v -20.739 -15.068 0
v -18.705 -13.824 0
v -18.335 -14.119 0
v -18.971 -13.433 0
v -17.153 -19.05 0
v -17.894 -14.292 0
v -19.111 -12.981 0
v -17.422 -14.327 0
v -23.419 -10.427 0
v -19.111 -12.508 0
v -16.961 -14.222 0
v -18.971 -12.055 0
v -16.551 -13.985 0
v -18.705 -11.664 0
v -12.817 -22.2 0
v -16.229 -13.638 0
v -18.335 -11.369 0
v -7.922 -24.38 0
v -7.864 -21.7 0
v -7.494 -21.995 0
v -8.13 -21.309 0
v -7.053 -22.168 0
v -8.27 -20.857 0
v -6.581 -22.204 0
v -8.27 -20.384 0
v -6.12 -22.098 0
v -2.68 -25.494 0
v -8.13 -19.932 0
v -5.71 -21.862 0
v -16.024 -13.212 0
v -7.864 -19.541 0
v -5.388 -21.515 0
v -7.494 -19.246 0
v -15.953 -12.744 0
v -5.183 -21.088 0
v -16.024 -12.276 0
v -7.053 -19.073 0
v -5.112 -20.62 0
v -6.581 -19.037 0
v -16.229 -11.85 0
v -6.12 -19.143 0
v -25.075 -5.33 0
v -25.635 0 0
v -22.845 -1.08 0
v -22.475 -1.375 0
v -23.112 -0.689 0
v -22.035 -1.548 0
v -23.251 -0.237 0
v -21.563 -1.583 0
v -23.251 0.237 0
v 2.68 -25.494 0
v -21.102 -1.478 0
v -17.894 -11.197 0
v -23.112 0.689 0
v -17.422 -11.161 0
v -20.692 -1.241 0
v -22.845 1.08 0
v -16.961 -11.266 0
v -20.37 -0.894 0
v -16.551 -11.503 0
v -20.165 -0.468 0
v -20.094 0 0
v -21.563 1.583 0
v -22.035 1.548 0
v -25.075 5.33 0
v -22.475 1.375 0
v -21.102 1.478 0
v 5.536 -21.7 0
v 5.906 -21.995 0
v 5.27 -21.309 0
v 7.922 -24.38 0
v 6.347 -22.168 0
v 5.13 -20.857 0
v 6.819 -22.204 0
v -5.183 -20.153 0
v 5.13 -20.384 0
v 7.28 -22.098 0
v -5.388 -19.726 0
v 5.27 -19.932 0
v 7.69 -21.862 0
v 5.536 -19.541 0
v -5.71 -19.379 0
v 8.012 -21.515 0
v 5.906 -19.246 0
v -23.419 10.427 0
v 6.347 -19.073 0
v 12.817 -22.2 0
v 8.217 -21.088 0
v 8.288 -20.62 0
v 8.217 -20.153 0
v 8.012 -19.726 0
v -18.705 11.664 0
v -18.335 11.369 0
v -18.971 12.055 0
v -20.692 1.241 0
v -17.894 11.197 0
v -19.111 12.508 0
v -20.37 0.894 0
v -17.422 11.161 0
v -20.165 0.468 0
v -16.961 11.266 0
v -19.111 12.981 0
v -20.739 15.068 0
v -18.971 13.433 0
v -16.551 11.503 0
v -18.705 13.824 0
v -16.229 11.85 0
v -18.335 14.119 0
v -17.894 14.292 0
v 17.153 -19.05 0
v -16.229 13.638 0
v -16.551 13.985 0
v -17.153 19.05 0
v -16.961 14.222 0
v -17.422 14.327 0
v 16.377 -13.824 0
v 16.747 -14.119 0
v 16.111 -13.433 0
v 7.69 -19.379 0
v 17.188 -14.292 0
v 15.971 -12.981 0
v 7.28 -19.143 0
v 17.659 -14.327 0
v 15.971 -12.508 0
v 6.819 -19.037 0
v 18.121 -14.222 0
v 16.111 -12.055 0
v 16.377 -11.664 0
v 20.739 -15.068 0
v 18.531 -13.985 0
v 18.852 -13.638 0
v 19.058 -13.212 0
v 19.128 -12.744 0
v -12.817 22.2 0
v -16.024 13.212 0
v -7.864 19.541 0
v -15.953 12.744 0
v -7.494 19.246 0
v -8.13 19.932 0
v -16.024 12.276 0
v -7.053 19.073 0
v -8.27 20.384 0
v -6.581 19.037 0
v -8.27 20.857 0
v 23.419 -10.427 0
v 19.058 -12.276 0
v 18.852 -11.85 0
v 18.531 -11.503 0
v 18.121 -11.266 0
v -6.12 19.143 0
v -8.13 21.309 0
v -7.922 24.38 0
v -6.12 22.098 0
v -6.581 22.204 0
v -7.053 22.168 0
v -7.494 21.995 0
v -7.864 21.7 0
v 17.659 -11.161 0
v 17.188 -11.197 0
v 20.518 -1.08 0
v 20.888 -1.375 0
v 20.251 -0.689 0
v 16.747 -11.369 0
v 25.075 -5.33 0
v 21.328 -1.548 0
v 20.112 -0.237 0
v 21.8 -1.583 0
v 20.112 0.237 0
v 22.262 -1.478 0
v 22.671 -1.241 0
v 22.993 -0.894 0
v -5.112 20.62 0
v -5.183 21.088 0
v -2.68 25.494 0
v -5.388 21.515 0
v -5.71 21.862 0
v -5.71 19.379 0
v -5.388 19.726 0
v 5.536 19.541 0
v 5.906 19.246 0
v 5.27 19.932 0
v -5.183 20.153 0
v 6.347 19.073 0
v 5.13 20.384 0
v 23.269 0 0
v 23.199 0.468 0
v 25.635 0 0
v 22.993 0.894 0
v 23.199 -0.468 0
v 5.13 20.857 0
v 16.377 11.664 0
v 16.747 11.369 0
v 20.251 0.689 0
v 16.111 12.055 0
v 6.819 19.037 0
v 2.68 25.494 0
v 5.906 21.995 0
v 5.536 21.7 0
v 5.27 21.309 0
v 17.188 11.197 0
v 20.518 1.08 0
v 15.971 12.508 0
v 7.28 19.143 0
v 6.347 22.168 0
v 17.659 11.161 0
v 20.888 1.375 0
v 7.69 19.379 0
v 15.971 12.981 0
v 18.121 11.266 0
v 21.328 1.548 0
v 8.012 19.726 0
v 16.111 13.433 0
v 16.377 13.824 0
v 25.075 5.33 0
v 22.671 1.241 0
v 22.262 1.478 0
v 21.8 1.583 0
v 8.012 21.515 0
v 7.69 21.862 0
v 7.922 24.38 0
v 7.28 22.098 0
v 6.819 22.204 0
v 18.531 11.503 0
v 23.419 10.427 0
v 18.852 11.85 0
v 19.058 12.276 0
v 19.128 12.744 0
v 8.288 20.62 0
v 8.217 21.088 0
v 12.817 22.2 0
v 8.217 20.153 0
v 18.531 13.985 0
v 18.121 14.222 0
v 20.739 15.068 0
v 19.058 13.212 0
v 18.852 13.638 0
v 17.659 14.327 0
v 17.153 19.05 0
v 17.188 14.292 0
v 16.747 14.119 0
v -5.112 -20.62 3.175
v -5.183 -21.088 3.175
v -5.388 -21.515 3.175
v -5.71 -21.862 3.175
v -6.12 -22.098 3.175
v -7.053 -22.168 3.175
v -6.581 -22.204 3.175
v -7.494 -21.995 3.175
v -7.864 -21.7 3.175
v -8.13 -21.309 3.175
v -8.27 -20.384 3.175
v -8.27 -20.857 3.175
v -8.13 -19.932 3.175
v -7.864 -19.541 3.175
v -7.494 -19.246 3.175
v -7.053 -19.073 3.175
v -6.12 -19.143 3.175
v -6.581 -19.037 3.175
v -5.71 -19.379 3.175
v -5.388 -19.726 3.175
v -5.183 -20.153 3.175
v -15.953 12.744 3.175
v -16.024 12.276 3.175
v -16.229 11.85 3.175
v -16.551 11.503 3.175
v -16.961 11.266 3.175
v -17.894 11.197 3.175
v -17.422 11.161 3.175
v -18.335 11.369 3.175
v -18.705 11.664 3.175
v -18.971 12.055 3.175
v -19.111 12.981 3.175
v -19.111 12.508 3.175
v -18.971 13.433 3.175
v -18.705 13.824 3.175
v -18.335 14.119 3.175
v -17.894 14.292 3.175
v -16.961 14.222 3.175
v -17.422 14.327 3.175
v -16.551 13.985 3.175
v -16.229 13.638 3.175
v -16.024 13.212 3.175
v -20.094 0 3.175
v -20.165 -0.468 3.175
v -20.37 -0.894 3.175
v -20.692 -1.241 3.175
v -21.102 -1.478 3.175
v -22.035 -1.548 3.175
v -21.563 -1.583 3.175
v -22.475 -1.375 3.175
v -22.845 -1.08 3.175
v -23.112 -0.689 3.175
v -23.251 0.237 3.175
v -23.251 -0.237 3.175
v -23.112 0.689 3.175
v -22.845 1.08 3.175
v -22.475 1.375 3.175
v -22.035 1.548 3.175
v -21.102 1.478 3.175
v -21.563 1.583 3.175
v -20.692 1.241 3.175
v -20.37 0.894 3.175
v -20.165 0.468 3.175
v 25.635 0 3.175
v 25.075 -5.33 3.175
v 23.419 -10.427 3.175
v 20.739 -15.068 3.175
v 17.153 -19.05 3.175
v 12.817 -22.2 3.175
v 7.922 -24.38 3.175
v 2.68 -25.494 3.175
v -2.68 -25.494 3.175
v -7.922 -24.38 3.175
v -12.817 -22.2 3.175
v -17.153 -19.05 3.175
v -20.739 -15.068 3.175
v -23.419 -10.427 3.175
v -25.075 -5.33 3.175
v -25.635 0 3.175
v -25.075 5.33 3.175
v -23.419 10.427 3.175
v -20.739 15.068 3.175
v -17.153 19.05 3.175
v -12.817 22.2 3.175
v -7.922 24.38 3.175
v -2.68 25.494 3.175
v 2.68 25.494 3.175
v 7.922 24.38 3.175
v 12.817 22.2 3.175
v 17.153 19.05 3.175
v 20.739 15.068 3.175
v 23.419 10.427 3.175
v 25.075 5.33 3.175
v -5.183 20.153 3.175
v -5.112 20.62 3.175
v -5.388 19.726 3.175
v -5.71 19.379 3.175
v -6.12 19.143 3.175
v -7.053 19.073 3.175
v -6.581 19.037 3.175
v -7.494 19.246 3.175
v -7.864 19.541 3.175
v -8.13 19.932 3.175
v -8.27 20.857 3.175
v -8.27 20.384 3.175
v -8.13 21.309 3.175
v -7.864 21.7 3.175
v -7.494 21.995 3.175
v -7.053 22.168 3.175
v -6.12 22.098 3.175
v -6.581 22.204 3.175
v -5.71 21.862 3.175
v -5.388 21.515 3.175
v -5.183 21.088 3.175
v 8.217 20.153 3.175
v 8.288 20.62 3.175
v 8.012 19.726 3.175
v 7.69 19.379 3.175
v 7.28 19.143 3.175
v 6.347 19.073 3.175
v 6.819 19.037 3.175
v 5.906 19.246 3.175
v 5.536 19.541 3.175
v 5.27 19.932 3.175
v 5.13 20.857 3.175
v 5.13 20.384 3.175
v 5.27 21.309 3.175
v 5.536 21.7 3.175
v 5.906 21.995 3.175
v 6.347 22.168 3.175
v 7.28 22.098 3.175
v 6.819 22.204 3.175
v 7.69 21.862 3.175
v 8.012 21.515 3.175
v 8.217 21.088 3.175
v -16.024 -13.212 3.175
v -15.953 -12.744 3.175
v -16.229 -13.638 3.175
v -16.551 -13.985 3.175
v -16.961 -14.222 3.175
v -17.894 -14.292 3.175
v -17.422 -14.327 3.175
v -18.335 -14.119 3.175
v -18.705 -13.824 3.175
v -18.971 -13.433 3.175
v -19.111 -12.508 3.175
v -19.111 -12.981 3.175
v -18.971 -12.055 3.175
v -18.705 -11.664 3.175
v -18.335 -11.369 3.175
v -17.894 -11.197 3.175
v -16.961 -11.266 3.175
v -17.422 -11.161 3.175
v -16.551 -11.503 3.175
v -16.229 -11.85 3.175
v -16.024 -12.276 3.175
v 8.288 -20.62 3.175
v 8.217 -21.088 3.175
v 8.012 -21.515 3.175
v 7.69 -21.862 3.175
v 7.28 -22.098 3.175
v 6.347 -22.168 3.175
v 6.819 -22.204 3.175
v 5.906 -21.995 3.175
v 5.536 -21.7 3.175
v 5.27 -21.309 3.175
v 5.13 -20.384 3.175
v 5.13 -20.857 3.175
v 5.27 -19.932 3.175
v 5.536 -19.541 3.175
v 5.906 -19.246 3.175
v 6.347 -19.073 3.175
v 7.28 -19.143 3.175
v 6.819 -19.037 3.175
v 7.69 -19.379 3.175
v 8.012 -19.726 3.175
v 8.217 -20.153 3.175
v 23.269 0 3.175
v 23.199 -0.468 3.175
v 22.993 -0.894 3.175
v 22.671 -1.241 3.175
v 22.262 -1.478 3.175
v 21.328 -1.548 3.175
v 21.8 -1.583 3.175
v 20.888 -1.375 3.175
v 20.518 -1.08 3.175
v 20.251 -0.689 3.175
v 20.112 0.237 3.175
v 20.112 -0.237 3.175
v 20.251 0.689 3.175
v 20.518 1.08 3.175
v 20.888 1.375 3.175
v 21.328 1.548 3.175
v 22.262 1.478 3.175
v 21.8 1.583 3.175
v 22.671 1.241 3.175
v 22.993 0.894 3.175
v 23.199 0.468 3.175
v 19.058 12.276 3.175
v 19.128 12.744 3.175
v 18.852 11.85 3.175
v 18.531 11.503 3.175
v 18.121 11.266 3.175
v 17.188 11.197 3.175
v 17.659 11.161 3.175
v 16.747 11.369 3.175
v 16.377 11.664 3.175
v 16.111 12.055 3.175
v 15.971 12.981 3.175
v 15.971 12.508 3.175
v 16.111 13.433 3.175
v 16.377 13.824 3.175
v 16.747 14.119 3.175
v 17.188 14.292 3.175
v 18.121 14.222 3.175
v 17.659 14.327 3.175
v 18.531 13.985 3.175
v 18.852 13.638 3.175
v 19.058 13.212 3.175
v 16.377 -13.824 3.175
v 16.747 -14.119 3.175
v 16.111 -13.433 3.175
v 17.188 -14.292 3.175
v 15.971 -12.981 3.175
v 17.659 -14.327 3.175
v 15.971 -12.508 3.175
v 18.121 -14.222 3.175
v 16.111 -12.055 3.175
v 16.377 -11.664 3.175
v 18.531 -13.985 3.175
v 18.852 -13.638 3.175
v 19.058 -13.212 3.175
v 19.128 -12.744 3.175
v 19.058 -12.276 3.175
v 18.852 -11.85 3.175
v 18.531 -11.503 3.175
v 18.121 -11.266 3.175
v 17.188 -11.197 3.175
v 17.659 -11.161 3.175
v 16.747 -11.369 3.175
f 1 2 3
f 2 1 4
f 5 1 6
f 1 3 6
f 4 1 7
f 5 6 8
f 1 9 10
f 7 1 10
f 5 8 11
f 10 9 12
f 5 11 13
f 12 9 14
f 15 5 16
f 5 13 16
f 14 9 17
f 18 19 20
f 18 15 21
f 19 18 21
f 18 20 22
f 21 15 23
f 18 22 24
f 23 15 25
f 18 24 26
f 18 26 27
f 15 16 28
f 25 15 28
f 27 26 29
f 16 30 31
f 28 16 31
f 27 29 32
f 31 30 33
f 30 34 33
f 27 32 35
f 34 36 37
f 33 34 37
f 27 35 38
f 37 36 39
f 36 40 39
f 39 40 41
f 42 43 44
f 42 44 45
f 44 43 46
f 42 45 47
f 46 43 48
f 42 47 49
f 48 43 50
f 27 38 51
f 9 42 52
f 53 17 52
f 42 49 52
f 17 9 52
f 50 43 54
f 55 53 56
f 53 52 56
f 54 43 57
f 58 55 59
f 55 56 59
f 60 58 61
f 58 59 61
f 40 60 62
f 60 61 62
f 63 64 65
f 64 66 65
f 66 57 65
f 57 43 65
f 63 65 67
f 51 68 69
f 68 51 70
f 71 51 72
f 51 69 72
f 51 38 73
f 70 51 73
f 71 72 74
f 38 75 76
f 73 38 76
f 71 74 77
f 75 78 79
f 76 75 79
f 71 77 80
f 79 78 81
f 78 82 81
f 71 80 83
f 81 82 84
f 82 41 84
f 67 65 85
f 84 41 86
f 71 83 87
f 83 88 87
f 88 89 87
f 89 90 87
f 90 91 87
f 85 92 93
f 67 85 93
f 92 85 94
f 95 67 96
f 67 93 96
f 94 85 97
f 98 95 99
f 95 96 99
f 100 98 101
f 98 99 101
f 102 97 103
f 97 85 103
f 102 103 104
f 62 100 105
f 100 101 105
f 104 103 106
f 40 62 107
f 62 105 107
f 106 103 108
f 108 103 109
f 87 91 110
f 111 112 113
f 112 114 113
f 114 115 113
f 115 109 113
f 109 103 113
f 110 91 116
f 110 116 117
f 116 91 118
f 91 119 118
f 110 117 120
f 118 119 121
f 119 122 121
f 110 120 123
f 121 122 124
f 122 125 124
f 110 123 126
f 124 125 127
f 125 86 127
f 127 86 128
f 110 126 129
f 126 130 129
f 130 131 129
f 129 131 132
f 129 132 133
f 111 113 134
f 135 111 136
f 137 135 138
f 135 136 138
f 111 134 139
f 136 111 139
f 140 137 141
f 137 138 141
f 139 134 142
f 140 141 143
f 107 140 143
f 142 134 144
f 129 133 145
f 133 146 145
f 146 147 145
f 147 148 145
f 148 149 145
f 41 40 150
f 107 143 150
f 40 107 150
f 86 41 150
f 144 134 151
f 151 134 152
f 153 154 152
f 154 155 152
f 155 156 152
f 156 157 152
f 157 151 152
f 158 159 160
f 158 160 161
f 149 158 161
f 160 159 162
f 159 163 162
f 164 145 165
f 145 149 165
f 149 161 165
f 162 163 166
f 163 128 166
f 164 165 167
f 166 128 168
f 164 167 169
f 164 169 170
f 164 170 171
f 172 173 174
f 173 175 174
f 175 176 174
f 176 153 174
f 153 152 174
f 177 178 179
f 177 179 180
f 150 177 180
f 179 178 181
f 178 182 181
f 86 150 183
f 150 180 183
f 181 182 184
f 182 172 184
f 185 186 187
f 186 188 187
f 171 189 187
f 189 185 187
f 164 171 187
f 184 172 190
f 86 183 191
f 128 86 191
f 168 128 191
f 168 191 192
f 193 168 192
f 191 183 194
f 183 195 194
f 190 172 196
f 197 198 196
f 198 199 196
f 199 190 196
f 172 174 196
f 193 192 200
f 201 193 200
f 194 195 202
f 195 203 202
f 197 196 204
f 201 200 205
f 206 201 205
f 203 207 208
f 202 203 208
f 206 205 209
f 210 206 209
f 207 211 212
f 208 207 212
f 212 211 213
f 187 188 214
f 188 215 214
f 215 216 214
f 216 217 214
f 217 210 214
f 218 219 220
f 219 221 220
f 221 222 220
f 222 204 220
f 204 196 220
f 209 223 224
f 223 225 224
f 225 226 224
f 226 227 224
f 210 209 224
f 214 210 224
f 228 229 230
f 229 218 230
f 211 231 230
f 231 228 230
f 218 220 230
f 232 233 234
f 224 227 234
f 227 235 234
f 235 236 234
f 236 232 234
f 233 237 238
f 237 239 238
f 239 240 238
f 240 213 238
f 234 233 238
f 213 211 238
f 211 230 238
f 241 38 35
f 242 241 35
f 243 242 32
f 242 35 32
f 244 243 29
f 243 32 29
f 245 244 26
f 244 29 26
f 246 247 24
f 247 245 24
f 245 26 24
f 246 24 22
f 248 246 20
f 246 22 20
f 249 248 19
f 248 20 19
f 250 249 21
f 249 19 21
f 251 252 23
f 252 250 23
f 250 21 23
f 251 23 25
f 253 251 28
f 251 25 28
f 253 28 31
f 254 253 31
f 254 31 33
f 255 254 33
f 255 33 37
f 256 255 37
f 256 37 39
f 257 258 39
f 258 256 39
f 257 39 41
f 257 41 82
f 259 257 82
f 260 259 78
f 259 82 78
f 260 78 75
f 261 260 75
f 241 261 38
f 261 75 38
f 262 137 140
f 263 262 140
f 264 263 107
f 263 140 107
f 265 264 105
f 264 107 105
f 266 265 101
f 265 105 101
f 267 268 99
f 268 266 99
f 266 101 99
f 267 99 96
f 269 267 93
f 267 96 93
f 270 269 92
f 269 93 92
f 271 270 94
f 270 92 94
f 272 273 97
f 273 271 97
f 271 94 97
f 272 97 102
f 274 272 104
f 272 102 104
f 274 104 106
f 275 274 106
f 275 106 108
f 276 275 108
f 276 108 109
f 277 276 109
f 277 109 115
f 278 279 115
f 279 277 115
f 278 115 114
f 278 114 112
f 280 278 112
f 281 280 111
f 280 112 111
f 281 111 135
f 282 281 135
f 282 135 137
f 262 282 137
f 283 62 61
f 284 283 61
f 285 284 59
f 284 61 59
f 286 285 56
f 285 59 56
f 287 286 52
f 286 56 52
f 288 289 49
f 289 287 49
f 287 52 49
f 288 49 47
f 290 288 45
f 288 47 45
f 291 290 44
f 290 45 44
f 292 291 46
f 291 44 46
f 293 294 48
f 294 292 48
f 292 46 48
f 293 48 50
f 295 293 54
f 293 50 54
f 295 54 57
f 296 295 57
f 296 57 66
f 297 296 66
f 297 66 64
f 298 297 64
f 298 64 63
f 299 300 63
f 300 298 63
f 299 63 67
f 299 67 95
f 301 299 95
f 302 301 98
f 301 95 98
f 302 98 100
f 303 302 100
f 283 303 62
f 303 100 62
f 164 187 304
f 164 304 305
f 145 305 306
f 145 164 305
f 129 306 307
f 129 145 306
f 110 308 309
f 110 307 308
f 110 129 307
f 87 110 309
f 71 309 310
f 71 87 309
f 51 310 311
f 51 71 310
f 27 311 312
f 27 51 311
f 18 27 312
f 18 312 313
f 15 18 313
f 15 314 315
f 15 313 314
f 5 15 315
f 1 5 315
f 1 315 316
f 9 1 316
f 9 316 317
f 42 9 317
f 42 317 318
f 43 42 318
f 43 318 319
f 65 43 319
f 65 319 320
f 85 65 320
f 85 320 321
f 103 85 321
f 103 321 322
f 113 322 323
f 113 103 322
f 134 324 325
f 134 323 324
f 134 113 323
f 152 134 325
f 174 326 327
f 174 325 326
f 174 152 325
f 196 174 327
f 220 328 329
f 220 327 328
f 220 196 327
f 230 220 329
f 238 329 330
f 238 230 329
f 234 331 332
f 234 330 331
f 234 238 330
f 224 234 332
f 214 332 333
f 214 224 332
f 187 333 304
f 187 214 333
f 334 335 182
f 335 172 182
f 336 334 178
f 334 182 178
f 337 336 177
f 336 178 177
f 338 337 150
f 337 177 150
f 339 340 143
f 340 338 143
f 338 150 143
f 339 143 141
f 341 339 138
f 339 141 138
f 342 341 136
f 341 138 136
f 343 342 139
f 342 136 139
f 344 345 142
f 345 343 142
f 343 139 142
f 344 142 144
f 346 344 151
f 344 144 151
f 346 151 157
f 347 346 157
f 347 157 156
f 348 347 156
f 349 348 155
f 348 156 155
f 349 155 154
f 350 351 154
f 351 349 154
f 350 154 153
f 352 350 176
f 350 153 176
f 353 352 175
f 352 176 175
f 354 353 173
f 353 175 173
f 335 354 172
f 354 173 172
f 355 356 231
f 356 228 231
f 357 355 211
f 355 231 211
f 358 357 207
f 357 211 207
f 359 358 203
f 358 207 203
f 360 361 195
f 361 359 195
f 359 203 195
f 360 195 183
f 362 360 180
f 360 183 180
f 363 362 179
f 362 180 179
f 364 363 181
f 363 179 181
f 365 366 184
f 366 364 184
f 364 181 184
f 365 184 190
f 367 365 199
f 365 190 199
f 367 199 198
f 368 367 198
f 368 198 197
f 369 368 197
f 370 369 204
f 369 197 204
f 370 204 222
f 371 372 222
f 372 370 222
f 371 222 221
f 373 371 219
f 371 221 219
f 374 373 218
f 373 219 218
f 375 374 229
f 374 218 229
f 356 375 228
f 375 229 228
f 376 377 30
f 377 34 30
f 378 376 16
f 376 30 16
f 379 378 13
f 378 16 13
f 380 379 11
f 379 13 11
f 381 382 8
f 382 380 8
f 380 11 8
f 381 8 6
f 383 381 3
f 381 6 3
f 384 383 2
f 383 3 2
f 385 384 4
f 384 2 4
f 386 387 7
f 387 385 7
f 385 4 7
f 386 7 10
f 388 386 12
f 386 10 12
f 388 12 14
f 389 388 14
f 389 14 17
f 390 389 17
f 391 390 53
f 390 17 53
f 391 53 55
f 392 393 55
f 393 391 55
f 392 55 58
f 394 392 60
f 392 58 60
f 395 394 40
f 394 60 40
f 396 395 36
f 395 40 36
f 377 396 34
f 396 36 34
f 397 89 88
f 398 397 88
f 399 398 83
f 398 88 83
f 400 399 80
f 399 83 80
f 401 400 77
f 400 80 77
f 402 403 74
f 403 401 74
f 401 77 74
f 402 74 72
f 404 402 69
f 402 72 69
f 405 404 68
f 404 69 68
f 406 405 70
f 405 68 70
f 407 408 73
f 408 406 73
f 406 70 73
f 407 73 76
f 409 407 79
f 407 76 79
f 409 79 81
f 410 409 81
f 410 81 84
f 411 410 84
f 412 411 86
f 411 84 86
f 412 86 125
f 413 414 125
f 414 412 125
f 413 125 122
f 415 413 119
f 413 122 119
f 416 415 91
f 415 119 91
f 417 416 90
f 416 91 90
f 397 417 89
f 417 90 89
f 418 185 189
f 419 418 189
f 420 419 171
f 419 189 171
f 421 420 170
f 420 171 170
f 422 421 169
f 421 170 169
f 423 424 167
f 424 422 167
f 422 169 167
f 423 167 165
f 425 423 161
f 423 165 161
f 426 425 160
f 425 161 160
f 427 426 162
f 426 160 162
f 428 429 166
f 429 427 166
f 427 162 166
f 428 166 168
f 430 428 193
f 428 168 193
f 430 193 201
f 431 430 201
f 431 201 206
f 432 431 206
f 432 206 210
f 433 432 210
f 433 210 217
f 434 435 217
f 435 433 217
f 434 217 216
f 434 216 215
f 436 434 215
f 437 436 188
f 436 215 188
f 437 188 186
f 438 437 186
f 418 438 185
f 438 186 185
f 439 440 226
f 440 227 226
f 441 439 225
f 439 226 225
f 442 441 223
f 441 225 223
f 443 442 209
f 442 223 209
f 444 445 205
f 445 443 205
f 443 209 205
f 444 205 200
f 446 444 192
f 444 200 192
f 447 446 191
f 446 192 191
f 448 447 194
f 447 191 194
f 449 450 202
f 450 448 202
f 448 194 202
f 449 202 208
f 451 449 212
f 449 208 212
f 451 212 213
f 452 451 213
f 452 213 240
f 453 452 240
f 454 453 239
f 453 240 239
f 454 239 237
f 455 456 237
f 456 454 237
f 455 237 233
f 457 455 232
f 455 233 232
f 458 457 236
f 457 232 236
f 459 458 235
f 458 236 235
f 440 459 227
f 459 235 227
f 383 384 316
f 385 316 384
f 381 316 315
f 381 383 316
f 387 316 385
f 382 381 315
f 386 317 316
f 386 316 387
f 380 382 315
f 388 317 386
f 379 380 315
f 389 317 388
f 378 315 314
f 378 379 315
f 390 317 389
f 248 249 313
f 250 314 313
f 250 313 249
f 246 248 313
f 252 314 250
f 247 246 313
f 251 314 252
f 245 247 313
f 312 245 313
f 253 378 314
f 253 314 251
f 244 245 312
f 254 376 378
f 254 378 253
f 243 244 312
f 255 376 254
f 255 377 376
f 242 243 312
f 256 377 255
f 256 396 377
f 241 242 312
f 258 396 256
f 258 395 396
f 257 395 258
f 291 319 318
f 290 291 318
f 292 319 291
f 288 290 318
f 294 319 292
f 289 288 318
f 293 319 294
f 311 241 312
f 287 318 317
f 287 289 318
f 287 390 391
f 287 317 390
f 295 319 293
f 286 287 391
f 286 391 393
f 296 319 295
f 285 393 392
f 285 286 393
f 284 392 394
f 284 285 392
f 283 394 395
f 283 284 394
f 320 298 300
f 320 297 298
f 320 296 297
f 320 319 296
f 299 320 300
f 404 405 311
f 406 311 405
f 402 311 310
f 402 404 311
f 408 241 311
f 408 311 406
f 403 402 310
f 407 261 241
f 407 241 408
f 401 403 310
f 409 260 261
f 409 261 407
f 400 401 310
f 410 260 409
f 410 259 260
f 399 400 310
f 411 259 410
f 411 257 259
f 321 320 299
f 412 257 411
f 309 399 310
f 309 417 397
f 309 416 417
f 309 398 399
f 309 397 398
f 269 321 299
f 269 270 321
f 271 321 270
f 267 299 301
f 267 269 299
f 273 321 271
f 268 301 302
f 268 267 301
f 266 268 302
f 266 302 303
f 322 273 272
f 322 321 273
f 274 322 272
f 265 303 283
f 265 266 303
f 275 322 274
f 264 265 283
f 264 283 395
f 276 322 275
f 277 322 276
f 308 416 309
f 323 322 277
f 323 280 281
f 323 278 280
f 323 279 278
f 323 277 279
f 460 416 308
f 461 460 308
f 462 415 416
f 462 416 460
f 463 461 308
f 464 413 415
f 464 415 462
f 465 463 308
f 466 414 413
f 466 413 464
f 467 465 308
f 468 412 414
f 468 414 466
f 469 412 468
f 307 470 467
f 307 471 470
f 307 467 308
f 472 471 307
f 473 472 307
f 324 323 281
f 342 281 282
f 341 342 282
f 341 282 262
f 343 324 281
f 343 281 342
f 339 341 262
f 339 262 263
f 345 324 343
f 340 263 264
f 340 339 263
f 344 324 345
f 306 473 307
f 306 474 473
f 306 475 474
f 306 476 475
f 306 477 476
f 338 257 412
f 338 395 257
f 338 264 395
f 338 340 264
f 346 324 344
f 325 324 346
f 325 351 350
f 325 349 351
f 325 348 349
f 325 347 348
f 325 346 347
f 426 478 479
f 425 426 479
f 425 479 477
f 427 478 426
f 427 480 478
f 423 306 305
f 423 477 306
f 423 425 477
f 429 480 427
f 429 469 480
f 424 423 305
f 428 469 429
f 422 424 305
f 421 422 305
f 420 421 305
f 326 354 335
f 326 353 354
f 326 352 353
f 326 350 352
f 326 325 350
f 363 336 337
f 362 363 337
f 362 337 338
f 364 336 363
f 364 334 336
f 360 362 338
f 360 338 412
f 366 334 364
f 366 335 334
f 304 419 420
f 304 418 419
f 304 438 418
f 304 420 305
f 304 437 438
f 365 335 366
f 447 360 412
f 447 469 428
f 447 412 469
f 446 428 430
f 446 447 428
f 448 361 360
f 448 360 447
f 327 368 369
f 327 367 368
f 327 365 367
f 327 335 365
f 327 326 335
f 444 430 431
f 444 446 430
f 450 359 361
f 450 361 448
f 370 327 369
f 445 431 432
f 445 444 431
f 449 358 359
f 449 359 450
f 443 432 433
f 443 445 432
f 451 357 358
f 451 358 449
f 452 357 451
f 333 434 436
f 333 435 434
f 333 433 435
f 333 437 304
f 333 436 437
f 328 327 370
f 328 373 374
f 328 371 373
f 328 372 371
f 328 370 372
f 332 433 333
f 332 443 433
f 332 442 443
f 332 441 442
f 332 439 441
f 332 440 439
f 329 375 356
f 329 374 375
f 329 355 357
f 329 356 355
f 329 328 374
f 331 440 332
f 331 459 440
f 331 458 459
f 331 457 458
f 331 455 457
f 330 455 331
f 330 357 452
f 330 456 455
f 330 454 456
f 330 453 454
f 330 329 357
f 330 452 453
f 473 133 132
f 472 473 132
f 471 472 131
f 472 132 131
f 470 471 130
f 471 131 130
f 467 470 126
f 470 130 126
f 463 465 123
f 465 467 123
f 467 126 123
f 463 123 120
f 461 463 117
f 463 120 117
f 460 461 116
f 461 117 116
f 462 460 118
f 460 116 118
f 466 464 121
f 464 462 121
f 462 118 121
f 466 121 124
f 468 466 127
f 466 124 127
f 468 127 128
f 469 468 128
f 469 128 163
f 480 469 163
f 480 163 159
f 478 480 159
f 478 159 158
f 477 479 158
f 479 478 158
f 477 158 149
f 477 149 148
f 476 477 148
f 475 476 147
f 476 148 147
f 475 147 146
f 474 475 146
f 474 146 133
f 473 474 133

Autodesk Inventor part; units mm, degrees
ref_plane "YZ Plane" through (0, 0, 0) normal (1, 0, 0) x (0, 1, 0)
ref_plane "XZ Plane" through (0, 0, 0) normal (0, 1, 0) x (-1, 0, 0)
ref_plane "XY Plane" through (0, 0, 0) normal (0, 0, 1) x (1, 0, 0)
ref_plane "Work Plane1" through (0, 0, 0) normal (0, 0, 1) x (1, 0, 0)
sketch "Sketch1" plane through (0, 0, 0) normal (0, 0, 1) x (1, 0, 0)
  circle A0 centre (0, 0) radius 25.6348 projected
  circle A1 centre (-6.7, 20.6205) radius 1.5875 projected
  circle A2 centre (6.7, 20.6205) radius 1.5875 projected
  circle A3 centre (17.5408, 12.7442) radius 1.5875 projected
  circle A4 centre (21.6817, 0) radius 1.5875 projected
  circle A5 centre (17.5408, -12.7442) radius 1.5875 projected
  circle A6 centre (6.7, -20.6205) radius 1.5875 projected
  circle A7 centre (-6.7, -20.6205) radius 1.5875 projected
  circle A8 centre (-17.5408, -12.7442) radius 1.5875 projected
  circle A9 centre (-21.6817, 0) radius 1.5875 projected
  circle A10 centre (-17.5408, 12.7442) radius 1.5875 projected
  point P0 (0, 0)
extrude "Extrusion1" add sketch "Sketch1" along normal blind 3.175
properties part number "topPlate" material "Polycarbonate, Clear"
